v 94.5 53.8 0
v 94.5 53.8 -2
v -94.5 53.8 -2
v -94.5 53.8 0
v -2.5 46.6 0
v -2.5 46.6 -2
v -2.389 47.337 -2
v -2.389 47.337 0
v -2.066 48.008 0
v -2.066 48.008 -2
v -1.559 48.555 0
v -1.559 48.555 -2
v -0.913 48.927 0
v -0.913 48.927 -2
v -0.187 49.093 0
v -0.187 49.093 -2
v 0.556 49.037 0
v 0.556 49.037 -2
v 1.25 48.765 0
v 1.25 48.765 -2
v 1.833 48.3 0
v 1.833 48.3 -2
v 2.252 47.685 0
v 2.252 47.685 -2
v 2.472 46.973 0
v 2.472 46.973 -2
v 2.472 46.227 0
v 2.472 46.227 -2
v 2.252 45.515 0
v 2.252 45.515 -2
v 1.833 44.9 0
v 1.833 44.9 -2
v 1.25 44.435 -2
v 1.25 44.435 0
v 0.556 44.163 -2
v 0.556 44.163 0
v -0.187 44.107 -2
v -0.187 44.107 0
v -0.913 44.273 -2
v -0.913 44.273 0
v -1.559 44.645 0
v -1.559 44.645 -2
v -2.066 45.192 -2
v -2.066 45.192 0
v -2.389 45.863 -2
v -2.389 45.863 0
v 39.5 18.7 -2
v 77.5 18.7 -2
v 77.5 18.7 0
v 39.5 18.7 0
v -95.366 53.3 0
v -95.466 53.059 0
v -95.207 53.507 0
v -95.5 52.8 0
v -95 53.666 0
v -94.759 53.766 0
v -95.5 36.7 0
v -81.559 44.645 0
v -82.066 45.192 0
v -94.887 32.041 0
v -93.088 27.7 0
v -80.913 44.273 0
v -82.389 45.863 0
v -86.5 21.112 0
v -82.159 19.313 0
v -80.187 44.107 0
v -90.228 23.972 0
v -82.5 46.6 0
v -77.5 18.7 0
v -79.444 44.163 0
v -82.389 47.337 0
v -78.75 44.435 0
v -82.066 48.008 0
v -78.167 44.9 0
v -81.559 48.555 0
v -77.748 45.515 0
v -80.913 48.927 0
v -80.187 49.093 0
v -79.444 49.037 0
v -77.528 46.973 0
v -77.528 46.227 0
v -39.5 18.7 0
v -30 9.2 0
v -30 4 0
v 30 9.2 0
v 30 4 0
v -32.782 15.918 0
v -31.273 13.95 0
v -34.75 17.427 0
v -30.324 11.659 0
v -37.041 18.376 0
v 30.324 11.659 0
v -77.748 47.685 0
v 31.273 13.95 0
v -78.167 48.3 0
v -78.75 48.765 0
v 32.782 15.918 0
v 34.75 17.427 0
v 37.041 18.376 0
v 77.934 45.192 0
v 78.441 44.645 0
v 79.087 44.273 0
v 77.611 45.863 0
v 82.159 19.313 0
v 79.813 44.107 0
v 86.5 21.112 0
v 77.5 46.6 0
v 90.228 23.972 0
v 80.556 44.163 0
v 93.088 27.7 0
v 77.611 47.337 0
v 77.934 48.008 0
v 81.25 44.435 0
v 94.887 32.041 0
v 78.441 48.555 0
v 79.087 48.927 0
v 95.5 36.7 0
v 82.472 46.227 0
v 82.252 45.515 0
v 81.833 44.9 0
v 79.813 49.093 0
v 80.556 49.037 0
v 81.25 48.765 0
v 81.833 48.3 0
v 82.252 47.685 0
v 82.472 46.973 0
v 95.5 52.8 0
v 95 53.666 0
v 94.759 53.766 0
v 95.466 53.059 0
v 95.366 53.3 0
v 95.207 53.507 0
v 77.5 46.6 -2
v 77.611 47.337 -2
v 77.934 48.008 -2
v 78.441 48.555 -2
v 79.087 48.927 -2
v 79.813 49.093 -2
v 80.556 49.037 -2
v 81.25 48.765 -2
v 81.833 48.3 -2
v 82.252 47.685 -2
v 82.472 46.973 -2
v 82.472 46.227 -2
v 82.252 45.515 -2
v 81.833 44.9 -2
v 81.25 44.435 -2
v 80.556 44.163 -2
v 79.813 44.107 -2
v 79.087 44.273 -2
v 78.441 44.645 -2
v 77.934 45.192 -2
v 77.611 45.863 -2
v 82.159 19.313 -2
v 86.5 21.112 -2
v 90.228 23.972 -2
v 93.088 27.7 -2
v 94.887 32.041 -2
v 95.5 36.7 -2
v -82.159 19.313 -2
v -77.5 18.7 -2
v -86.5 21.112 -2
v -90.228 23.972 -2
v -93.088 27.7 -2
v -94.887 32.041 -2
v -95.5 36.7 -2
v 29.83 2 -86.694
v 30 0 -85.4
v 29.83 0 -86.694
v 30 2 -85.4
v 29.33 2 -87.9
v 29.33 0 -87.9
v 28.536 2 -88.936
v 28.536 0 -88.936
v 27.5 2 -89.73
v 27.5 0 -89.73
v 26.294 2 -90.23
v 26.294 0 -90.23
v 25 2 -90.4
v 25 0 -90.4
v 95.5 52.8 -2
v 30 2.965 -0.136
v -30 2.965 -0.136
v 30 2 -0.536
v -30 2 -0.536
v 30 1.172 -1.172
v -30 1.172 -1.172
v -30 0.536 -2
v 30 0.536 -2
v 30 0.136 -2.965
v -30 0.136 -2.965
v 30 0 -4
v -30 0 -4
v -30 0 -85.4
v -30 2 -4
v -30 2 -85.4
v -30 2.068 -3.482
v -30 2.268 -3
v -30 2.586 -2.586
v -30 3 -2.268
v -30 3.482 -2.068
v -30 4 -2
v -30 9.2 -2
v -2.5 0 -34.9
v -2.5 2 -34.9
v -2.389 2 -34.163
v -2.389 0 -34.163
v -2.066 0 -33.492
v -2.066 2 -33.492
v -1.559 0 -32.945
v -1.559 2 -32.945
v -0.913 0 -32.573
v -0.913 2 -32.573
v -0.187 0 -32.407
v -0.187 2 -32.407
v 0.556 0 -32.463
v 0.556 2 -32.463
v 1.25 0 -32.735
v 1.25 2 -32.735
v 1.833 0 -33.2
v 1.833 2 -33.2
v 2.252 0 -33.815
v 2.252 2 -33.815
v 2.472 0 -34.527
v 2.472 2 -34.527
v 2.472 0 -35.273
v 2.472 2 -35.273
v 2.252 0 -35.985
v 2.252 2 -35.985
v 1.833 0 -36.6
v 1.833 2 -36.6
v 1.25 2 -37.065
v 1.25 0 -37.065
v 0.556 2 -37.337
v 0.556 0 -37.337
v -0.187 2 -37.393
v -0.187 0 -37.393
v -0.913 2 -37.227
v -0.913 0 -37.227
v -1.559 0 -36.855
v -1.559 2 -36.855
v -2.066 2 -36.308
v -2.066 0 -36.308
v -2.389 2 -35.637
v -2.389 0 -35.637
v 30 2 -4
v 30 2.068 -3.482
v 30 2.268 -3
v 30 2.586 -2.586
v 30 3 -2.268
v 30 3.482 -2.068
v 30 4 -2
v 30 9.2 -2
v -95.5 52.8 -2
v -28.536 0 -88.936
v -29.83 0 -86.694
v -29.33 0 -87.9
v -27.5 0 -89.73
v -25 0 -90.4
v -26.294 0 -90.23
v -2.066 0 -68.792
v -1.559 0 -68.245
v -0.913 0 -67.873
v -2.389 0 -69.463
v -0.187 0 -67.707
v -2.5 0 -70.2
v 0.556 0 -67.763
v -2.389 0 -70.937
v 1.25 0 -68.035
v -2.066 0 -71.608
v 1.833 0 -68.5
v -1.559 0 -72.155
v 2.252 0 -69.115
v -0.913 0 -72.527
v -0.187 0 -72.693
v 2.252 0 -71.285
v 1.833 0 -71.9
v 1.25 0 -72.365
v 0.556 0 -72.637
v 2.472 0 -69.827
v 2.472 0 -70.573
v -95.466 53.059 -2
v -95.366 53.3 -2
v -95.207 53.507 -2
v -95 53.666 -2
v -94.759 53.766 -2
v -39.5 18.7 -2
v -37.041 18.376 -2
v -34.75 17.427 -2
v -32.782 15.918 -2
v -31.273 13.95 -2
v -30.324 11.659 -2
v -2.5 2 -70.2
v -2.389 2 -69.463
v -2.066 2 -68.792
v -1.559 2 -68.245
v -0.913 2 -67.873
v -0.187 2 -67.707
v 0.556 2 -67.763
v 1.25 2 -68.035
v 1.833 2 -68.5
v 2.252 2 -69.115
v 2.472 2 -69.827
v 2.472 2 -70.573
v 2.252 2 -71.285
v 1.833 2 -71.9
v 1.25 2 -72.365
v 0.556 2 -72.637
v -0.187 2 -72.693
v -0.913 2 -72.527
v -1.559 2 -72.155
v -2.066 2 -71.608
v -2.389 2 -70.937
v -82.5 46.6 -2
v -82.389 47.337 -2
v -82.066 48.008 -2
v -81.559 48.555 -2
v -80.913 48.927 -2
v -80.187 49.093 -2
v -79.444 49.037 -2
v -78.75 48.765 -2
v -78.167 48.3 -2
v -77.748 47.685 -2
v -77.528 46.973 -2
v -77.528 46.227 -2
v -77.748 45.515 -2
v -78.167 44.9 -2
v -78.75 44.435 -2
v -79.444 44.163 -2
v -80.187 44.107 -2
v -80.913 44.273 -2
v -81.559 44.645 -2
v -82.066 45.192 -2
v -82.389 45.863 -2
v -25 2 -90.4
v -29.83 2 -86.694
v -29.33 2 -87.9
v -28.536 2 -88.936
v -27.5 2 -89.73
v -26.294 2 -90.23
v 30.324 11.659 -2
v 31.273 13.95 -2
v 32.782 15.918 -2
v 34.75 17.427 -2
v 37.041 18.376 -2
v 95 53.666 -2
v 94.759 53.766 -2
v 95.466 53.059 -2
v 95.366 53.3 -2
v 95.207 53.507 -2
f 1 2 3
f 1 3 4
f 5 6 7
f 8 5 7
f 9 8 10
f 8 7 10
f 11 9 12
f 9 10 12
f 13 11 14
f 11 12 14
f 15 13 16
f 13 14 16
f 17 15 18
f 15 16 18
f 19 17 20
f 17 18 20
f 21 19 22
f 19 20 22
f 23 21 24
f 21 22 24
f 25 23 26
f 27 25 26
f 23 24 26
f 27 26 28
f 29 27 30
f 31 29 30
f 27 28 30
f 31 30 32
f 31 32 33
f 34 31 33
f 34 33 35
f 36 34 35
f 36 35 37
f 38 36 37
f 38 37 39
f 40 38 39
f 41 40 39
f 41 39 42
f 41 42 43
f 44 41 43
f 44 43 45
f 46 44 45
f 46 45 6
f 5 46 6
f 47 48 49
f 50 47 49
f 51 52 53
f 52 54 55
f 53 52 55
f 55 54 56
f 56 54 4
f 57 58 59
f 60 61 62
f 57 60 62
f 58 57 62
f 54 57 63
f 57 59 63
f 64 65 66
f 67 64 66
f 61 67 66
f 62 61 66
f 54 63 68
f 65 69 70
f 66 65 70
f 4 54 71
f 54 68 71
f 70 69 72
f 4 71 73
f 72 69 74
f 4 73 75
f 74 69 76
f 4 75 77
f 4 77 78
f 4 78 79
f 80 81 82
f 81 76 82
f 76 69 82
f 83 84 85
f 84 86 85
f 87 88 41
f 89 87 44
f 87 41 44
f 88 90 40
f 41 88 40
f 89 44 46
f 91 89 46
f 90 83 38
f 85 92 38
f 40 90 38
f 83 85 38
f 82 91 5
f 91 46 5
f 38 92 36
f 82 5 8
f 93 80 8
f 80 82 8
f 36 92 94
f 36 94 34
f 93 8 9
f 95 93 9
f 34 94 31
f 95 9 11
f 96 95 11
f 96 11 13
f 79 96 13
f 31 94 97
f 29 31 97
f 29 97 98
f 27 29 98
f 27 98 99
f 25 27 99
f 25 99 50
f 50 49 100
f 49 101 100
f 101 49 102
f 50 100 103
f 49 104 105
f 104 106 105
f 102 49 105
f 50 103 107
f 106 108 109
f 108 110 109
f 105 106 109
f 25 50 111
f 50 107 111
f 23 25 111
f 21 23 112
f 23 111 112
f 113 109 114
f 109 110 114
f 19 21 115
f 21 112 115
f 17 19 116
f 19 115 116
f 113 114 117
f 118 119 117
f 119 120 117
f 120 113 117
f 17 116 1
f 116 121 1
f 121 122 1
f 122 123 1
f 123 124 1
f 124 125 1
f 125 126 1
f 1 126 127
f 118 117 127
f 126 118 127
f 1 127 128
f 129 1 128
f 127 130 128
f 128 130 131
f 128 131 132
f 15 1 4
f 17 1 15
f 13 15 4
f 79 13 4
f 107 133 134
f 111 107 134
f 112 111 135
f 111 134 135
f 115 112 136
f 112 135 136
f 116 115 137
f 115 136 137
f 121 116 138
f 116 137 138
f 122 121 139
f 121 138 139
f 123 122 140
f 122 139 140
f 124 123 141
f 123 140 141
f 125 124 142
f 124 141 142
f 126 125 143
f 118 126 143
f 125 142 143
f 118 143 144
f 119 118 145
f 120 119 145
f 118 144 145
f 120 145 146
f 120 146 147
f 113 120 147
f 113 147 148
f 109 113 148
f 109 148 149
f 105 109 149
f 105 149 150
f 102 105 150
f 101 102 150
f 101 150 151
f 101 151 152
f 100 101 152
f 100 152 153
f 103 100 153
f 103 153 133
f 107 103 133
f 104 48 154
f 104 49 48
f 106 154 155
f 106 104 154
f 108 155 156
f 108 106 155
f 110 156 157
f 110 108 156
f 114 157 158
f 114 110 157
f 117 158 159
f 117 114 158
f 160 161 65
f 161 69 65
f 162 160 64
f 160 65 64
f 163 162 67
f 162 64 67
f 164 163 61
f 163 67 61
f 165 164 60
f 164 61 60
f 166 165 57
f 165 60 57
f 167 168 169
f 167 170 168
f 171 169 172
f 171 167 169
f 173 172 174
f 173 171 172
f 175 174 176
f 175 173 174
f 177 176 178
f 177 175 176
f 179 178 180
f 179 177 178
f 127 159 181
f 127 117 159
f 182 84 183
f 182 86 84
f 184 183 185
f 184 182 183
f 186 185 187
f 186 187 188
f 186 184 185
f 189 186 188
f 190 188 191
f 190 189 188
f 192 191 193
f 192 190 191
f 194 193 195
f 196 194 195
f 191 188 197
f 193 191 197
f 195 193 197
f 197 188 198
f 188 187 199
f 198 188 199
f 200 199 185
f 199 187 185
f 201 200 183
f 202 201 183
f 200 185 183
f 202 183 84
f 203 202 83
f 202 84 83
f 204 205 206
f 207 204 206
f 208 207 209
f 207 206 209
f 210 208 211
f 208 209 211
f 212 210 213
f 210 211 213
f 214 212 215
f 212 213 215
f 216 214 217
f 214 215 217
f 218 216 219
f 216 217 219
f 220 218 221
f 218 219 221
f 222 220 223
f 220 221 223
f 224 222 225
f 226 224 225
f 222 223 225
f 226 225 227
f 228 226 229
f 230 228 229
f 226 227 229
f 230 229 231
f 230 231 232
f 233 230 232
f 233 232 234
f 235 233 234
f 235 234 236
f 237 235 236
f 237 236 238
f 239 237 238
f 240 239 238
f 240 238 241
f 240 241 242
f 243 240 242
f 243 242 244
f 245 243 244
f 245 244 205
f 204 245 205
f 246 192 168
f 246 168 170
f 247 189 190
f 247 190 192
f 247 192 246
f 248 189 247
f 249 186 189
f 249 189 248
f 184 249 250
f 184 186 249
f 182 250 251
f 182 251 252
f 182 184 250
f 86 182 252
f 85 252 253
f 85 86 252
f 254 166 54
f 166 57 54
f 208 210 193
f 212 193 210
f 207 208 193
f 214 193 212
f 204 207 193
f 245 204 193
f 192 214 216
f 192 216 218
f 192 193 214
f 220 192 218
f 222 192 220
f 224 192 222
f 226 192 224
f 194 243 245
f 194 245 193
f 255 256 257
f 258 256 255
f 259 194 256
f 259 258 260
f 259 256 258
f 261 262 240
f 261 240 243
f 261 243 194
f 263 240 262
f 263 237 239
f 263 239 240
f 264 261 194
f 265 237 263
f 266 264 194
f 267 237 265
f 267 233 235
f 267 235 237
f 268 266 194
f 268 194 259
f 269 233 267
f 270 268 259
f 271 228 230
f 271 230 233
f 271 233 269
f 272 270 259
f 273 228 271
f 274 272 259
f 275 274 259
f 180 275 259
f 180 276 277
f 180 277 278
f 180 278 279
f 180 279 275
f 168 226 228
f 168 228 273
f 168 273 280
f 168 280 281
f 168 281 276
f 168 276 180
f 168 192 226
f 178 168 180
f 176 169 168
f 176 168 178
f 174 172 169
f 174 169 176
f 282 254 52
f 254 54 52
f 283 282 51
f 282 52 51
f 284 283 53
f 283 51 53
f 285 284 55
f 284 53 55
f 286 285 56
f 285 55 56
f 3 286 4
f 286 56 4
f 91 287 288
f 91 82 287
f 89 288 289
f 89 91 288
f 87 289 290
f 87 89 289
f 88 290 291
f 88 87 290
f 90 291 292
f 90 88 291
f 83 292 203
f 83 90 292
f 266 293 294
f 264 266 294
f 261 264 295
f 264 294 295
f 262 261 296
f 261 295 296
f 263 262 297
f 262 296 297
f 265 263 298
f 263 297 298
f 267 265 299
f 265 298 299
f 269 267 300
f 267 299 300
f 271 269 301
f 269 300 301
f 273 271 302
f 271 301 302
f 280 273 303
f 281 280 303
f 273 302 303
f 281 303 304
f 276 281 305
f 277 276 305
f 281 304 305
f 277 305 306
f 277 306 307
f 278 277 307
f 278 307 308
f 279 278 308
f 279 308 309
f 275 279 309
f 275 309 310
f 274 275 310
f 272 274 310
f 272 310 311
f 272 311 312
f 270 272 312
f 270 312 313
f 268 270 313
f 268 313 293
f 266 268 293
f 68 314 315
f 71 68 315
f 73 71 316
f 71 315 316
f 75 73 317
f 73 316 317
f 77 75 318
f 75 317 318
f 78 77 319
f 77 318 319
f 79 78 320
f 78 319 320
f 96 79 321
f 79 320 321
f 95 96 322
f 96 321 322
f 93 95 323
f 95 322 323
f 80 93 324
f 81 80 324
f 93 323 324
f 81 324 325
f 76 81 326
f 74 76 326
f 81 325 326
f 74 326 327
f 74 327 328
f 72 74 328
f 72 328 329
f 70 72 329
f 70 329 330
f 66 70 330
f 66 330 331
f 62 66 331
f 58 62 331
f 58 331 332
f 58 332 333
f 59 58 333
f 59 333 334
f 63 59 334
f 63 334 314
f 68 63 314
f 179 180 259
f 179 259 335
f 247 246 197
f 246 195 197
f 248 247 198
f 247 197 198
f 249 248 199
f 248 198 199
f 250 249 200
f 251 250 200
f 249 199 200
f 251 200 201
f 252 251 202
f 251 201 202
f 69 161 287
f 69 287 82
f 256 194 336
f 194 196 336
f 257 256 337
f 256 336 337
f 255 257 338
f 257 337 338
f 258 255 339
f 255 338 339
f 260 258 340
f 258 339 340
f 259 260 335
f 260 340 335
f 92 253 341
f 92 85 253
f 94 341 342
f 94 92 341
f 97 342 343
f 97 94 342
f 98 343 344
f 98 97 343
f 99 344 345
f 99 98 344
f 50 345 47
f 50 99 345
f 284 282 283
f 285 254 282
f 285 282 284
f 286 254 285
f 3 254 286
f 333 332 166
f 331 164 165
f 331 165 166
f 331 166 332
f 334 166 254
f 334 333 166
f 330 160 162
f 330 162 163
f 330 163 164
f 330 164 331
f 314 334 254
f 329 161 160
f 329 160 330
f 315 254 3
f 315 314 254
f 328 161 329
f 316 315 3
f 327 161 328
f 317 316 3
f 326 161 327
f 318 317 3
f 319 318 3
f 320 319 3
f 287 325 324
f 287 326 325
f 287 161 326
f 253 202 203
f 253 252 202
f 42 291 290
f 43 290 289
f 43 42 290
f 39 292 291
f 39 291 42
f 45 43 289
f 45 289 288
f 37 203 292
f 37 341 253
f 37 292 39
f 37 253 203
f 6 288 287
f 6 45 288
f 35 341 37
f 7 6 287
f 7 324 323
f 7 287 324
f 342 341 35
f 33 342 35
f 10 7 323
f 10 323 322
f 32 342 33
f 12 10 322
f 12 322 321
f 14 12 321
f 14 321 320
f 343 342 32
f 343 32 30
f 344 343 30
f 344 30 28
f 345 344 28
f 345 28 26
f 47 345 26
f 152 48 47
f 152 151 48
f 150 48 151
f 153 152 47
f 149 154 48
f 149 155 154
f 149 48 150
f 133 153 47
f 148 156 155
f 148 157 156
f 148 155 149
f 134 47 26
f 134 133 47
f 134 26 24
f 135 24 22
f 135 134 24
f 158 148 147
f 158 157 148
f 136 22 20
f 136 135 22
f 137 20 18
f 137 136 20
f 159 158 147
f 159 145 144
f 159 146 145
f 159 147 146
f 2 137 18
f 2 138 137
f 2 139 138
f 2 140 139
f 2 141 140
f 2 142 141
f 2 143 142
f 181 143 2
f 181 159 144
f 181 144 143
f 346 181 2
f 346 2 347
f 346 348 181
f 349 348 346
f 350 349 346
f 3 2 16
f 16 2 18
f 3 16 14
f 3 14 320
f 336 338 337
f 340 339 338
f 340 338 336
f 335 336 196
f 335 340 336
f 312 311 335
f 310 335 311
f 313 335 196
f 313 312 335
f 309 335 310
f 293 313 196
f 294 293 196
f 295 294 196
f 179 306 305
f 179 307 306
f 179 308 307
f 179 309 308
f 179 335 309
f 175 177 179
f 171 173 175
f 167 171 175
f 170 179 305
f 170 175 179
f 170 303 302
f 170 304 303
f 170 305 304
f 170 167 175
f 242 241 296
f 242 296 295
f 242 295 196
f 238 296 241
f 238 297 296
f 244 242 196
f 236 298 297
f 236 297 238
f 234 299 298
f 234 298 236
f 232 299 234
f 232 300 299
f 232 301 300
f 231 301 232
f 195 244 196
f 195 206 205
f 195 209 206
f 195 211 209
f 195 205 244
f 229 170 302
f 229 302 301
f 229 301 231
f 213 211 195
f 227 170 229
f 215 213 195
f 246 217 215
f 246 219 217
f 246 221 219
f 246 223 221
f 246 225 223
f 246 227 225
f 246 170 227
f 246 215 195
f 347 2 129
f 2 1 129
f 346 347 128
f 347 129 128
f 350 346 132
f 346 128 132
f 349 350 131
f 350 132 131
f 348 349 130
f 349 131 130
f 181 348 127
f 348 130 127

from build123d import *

# Parameters (mm, degrees)
F0_W     = 35.1
F0_H     = 2
F1_DEPTH = 95.5
F2_DEPTH = 30
F3_R     = 18
F4_R     = 9.5
F5_R     = 5
F7_D     = 5
F9_D     = 5
F10_R    = 1
F11_R    = 4
F12_R    = 2


with BuildPart() as f1:
    # F0 (on Right) → F1 (new body, symmetric)
    with BuildSketch(Plane.YZ):
        with Locations((36.25, -1)):
            Rectangle(F0_W, F0_H)
    extrude(amount=F1_DEPTH, both=True)

    # F0 (on Right) → F2 (join, symmetric)
    with BuildSketch(Plane.YZ):
        Polygon((18.7, 0), (3.5, 0), (0, 0), (0, -3.5), (0, -90.4), (2, -90.4), (2, -3.5), (2, -2), (3.5, -2), (18.7, -2), align=None)
    extrude(amount=F2_DEPTH, both=True)

    # F3
    f3_edges = [f1.edges().sort_by_distance(p)[0] for p in [
        (95.5, 18.7, -1),
        (-95.5, 18.7, -1),
    ]]
    fillet(f3_edges, radius=F3_R)

    # F4
    f4_edges = [f1.edges().sort_by_distance(p)[0] for p in [
        (-30, 18.7, -1),
        (30, 18.7, -1),
    ]]
    fillet(f4_edges, radius=F4_R)

    # F5
    f5_edges = [f1.edges().sort_by_distance(p)[0] for p in [
        (-30, 1, -90.4),
        (30, 1, -90.4),
    ]]
    fillet(f5_edges, radius=F5_R)

    # F7 (through all)
    with Locations(Plane.XZ):
        with Locations((0, -70.2), (0, -34.9)):
            Hole(F7_D / 2)

    # F9 (through all)
    with Locations(Plane.XY):
        with Locations((-80, 46.6), (0, 46.6), (80, 46.6)):
            Hole(F9_D / 2)

    # F10
    f10_edges = [f1.edges().sort_by_distance(p)[0] for p in [
        (95.5, 53.8, -1),
        (-95.5, 53.8, -1),
    ]]
    fillet(f10_edges, radius=F10_R)

    # F11
    f11_edges = [f1.edges().sort_by_distance(p)[0] for p in [
        (0, 0, 0),
    ]]
    fillet(f11_edges, radius=F11_R)

    # F12
    f12_edges = [f1.edges().sort_by_distance(p)[0] for p in [
        (0, 2, -2),
    ]]
    fillet(f12_edges, radius=F12_R)


solid = f1.part
